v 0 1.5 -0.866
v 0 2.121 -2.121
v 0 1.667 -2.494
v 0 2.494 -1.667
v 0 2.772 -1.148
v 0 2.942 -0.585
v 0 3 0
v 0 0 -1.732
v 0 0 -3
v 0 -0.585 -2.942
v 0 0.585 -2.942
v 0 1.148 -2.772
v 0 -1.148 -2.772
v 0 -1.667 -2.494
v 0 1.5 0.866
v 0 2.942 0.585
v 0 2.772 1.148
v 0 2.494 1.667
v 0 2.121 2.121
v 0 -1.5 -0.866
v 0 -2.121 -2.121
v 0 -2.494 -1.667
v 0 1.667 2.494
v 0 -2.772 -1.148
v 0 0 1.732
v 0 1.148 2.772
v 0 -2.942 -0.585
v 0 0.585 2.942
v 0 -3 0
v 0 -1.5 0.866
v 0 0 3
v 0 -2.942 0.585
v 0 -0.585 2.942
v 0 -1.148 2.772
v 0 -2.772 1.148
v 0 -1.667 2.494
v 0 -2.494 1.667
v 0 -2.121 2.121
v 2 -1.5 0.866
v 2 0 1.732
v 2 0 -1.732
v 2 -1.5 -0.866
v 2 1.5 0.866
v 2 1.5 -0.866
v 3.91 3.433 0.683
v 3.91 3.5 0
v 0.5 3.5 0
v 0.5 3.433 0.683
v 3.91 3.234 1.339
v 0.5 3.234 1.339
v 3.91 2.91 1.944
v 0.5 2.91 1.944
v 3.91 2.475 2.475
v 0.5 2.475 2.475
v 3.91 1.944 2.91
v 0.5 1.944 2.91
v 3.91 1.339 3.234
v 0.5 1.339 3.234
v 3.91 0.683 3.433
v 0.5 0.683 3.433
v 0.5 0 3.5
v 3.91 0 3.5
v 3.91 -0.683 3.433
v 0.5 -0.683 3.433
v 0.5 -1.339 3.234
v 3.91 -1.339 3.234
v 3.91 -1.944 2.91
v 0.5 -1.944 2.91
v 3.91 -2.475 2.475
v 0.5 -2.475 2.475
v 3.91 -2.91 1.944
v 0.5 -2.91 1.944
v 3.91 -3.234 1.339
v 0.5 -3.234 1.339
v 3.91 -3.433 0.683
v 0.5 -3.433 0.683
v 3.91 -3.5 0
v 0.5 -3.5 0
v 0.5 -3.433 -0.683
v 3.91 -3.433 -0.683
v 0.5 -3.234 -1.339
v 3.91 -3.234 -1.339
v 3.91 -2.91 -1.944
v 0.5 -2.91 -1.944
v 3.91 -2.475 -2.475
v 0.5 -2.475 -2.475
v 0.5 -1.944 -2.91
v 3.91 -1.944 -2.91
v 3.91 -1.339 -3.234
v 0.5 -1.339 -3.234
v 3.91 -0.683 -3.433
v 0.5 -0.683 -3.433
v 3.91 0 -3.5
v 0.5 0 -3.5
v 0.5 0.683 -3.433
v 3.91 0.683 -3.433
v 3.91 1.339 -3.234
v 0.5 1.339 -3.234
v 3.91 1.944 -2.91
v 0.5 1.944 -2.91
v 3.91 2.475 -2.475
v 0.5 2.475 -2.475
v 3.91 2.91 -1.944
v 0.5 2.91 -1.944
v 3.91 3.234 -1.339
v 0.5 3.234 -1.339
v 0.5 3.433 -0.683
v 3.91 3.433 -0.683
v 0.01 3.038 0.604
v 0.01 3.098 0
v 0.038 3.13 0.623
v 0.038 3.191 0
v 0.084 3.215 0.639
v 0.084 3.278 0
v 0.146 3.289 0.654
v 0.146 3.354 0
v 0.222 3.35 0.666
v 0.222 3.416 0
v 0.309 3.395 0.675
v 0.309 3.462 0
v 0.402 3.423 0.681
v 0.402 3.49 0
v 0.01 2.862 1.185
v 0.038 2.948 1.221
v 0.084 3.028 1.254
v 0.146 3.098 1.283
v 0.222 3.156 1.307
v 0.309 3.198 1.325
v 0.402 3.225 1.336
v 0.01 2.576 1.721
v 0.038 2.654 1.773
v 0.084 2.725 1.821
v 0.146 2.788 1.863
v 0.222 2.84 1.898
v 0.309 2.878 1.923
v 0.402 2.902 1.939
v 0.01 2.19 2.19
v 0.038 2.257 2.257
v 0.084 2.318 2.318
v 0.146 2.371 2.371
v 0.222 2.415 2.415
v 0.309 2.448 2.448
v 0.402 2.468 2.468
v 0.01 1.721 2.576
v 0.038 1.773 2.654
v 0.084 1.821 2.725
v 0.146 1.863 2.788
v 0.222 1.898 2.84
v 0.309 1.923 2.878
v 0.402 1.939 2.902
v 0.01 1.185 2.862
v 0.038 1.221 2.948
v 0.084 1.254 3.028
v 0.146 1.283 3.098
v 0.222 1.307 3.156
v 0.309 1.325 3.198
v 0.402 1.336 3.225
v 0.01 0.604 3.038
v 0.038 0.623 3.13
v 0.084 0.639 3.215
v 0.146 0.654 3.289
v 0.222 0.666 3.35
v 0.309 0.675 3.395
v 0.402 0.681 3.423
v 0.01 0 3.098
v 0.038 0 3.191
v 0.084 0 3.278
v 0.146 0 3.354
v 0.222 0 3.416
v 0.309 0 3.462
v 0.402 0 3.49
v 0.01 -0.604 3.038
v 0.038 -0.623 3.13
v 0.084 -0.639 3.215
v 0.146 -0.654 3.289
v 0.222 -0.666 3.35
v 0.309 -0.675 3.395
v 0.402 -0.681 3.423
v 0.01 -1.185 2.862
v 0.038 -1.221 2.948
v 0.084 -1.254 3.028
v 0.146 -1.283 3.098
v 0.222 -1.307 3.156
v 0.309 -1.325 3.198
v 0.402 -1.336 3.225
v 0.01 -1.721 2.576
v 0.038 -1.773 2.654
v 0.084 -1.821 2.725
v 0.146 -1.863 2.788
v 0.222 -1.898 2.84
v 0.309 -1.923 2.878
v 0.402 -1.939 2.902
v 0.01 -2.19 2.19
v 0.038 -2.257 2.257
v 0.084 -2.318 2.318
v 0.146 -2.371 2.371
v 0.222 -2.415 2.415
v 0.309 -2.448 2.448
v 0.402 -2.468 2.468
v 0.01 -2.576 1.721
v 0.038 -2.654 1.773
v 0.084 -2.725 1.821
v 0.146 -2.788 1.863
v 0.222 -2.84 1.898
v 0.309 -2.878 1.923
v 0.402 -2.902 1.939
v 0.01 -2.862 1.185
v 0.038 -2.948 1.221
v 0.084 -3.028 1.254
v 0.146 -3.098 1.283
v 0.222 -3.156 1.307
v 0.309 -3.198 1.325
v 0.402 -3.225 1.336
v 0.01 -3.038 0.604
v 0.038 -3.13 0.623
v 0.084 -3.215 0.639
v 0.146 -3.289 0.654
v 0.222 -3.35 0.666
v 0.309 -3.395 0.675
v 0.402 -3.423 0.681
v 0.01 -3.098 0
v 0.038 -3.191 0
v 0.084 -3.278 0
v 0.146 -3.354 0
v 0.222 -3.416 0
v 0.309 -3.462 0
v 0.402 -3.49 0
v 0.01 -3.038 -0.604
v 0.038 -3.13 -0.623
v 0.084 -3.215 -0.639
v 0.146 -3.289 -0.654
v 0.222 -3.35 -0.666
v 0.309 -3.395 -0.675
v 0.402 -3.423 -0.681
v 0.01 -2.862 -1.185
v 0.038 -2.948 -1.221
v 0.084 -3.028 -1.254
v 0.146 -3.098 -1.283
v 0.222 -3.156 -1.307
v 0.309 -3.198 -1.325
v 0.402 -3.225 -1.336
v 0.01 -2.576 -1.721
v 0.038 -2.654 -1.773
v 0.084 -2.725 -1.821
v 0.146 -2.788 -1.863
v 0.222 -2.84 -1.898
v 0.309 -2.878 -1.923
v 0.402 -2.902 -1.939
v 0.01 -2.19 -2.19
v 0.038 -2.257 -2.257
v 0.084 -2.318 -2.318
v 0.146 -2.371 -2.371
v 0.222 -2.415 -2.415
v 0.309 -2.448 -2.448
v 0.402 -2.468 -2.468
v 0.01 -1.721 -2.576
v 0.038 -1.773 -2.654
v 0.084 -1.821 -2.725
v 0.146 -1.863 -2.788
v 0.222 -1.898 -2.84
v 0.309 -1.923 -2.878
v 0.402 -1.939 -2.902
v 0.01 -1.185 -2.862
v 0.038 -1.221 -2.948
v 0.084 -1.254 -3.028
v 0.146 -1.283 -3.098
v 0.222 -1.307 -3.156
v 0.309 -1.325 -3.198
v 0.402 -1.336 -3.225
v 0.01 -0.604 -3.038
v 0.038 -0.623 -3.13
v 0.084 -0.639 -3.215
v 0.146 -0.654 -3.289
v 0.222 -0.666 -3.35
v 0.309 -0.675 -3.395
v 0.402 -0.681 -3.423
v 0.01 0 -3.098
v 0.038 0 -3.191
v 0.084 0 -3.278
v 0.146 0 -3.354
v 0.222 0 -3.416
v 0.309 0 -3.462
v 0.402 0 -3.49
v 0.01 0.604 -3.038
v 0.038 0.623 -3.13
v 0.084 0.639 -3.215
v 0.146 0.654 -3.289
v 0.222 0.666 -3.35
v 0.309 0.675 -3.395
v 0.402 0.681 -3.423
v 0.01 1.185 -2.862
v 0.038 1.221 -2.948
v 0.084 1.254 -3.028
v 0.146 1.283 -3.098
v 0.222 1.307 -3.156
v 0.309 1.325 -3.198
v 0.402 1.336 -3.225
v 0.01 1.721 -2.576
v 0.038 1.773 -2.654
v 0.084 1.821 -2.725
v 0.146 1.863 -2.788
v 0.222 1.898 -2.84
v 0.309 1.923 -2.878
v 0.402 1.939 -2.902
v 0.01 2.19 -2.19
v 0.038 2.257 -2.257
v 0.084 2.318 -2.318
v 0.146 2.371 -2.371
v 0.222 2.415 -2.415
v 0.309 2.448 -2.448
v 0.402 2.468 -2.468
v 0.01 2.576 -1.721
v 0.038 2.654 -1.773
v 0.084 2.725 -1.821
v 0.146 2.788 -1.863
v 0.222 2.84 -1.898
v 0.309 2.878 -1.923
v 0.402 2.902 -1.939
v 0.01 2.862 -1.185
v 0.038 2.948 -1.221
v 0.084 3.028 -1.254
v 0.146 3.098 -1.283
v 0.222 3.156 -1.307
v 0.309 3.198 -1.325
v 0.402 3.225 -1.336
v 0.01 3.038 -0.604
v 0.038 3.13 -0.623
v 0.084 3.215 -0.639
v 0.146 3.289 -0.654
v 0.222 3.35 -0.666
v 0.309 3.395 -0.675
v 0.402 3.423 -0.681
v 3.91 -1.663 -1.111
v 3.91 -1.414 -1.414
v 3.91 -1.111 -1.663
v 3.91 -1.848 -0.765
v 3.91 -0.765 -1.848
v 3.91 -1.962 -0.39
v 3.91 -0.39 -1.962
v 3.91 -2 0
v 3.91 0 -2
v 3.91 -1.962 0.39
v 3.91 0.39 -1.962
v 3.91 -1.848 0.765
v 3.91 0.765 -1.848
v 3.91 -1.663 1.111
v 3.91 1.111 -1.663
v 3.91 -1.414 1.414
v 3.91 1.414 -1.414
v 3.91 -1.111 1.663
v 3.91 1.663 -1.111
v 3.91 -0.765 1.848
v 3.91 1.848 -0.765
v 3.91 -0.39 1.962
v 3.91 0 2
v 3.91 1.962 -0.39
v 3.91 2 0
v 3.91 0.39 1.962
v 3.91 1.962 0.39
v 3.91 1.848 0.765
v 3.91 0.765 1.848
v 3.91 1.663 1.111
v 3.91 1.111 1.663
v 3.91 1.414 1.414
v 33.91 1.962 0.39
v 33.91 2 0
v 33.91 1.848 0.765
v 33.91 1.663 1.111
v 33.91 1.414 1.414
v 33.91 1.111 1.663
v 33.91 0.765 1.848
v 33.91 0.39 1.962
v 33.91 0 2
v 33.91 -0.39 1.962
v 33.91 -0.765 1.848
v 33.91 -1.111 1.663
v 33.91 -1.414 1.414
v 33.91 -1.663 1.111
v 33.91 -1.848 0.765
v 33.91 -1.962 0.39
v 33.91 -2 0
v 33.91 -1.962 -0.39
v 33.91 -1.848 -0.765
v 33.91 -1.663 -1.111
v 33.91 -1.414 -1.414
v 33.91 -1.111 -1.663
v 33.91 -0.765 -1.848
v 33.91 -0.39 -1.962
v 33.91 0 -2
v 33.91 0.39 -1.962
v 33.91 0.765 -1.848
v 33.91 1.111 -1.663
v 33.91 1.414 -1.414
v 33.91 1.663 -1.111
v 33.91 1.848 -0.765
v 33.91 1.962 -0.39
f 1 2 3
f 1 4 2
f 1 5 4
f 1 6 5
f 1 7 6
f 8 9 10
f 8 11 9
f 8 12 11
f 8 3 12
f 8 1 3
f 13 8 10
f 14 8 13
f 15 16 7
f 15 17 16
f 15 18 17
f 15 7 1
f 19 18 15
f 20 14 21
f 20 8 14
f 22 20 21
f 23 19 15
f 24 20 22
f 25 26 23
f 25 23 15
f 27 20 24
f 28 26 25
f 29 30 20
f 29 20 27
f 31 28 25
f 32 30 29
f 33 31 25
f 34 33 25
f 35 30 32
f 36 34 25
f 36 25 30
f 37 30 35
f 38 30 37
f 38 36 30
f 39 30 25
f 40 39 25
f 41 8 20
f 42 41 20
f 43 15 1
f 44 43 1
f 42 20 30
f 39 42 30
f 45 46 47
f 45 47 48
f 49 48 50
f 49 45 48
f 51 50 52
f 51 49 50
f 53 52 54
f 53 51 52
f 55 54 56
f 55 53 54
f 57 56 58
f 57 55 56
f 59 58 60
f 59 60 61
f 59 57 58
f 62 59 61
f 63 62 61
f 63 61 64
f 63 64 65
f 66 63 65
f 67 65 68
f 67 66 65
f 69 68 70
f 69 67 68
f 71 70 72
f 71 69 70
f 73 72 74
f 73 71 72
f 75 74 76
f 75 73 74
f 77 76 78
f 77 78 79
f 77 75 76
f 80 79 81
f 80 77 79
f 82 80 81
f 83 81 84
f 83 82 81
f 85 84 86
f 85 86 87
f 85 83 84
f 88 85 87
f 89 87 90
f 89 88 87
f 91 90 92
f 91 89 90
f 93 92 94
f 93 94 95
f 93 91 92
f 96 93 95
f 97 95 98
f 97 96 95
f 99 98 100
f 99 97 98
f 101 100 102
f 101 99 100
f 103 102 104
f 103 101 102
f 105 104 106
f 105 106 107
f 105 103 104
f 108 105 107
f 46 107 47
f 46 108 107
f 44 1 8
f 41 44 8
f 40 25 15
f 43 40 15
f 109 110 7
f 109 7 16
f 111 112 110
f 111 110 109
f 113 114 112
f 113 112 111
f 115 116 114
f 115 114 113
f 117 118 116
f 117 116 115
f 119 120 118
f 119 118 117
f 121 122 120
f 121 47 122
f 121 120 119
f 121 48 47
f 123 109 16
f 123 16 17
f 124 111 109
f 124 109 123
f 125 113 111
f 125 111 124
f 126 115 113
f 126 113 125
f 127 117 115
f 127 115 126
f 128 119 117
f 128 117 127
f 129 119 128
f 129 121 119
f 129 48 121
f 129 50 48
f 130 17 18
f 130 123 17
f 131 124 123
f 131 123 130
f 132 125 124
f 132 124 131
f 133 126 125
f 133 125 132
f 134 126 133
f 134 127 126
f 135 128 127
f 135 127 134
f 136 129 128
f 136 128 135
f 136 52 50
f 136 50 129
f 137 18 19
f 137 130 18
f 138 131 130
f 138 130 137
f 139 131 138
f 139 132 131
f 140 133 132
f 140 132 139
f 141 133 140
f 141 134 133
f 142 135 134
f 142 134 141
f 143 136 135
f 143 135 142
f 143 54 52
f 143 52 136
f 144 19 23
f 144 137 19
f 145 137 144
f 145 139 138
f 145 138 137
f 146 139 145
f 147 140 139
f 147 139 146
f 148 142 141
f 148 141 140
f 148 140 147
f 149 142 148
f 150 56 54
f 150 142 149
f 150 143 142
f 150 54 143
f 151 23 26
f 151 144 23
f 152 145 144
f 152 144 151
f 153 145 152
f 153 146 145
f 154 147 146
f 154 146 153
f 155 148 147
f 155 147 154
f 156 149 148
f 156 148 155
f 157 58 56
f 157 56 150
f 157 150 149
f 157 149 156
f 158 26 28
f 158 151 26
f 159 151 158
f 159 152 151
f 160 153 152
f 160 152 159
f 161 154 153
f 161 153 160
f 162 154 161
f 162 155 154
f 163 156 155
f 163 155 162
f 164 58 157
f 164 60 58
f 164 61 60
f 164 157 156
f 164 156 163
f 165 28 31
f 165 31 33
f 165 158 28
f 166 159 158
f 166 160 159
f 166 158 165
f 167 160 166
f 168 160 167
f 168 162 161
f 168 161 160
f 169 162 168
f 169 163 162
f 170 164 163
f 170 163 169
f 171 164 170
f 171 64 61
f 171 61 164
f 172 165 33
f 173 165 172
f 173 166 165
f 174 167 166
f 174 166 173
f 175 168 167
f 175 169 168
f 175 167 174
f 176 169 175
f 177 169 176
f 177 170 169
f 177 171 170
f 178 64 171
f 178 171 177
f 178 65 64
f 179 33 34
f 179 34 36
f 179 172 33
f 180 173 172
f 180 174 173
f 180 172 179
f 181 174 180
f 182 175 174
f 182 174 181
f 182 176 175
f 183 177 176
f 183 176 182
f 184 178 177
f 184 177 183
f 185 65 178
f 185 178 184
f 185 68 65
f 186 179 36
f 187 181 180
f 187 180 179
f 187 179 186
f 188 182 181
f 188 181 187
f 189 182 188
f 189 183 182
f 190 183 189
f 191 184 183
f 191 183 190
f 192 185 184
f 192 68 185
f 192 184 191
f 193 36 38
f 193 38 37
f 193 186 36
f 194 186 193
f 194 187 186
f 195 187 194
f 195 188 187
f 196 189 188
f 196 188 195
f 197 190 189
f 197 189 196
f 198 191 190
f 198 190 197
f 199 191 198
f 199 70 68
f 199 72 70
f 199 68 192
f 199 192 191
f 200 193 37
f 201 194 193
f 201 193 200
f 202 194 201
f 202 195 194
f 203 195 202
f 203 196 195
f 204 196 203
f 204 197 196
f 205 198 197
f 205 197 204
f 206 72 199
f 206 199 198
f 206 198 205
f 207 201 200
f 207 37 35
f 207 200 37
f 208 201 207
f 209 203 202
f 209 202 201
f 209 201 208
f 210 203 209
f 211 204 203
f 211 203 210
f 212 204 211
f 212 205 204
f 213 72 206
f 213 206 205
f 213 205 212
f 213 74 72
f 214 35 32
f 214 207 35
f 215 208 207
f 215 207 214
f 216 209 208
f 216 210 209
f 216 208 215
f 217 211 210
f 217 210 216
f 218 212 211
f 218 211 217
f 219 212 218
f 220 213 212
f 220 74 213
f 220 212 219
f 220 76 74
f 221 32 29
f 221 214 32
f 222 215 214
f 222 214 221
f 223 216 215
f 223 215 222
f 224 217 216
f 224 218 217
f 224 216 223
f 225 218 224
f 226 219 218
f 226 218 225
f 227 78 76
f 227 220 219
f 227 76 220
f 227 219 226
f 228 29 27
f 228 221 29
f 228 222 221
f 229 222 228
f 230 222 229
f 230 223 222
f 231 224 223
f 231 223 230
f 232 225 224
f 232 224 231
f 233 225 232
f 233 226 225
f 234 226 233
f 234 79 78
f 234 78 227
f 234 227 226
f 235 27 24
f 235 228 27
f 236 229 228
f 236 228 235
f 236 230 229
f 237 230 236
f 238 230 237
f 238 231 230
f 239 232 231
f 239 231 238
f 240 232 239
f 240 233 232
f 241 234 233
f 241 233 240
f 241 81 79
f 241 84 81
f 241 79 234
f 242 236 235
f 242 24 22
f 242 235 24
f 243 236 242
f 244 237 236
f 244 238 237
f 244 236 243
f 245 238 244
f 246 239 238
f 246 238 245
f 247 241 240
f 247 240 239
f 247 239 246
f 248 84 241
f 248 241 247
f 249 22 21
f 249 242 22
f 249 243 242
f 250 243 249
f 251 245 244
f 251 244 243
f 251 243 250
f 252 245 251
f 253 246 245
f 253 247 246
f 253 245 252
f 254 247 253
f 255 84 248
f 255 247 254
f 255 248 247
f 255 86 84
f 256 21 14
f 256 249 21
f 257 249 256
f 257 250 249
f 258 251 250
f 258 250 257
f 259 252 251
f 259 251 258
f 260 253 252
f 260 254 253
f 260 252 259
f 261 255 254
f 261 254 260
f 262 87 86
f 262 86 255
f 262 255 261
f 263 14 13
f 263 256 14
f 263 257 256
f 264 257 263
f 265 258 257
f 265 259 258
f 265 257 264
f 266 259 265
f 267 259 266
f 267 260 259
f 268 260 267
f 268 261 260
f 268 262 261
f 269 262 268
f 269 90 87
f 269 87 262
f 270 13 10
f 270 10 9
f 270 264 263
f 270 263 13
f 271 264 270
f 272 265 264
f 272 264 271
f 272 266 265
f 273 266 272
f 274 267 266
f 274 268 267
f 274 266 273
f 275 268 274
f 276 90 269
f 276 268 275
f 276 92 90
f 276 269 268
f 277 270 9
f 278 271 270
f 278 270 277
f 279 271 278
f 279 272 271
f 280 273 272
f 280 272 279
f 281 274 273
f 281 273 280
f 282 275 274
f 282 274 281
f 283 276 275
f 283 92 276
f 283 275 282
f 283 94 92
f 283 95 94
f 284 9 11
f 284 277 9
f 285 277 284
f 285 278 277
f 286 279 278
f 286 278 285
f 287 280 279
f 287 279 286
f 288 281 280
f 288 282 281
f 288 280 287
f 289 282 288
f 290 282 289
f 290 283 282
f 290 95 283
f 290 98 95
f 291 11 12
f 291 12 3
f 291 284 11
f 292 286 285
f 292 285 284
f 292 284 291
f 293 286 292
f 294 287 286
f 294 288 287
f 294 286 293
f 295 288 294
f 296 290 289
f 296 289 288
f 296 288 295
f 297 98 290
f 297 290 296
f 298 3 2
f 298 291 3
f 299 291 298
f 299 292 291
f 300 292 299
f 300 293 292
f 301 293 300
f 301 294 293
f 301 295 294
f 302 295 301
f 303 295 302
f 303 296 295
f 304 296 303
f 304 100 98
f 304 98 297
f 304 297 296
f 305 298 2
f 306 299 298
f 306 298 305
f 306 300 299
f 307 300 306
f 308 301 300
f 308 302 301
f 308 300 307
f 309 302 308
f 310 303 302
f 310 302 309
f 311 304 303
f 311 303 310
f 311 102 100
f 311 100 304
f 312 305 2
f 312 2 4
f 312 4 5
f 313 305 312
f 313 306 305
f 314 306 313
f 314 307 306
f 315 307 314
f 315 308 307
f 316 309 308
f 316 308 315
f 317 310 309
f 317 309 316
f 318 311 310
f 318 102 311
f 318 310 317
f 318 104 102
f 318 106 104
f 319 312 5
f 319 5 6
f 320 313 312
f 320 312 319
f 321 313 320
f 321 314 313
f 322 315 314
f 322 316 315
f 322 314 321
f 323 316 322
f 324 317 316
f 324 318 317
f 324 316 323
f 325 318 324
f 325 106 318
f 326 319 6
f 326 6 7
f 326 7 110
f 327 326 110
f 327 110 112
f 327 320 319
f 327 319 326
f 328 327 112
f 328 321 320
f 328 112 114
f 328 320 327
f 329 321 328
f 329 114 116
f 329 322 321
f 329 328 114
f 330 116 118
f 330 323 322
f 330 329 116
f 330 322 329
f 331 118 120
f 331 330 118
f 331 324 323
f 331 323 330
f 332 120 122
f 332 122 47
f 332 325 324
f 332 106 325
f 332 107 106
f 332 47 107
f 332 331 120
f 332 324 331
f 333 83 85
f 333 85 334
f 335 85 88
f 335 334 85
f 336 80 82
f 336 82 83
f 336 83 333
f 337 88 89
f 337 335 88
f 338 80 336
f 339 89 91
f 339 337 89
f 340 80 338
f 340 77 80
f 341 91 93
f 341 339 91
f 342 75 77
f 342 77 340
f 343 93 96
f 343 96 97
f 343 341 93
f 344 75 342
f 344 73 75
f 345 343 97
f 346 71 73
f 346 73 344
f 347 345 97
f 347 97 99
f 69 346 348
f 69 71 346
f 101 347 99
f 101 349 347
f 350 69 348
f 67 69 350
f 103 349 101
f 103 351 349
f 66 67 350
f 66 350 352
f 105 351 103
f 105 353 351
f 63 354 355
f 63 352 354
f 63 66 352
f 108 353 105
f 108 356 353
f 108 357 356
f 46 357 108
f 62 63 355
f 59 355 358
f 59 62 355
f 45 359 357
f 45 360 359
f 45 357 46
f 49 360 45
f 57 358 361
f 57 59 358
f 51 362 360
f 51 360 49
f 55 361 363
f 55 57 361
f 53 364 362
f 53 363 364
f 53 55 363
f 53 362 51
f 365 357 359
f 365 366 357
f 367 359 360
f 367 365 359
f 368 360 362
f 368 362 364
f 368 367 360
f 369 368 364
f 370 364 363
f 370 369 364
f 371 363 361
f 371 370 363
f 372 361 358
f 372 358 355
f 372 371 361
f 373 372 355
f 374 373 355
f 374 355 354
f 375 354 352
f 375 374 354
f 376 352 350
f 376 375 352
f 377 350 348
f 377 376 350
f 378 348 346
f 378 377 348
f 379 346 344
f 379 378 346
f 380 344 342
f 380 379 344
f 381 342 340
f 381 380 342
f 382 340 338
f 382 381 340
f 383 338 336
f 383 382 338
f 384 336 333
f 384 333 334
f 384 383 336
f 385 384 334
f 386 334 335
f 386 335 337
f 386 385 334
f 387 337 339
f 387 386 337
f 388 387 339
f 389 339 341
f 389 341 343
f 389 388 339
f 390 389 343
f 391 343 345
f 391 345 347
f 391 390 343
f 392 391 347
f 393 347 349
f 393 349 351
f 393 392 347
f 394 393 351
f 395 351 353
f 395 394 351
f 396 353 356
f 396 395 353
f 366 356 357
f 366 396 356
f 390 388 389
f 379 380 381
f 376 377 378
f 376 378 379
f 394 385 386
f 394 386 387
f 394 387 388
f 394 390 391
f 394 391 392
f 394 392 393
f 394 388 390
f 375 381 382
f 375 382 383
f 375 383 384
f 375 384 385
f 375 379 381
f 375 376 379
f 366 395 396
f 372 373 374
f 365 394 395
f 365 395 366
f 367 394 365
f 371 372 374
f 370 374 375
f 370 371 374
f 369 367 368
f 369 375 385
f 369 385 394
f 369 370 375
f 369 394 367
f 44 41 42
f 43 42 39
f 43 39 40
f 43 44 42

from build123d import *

# Parameters (mm, degrees)
CUT_EXTRUDE_1_DEPTH = 2
FILLET_1_R          = 0.5


with BuildPart() as part:
    # 草图1 → 旋转1 (revolve)
    with BuildSketch(Plane.XY):
        Polygon((0, 0), (0, 3.5), (3.91, 3.5), (3.91, 2), (33.91, 2), (33.91, 0), align=None)
    revolve(axis=Axis((0, 0, 0), (1, 0, 0)))

    # 草图2 → 切除-拉伸1 (cut)
    with BuildSketch(Plane.ZY):
        Polygon((-1.732050808, 0), (-0.866025404, -1.5), (0.866025404, -1.5), (1.732050808, 0), (0.866025404, 1.5), (-0.866025404, 1.5), align=None)
    extrude(amount=-CUT_EXTRUDE_1_DEPTH, mode=Mode.SUBTRACT)

    # 圆角1
    fillet_1_edges = [part.edges().sort_by_distance(p)[0] for p in [
        (0, -3.5, 0),
    ]]
    fillet(fillet_1_edges, radius=FILLET_1_R)


solid = part.part
